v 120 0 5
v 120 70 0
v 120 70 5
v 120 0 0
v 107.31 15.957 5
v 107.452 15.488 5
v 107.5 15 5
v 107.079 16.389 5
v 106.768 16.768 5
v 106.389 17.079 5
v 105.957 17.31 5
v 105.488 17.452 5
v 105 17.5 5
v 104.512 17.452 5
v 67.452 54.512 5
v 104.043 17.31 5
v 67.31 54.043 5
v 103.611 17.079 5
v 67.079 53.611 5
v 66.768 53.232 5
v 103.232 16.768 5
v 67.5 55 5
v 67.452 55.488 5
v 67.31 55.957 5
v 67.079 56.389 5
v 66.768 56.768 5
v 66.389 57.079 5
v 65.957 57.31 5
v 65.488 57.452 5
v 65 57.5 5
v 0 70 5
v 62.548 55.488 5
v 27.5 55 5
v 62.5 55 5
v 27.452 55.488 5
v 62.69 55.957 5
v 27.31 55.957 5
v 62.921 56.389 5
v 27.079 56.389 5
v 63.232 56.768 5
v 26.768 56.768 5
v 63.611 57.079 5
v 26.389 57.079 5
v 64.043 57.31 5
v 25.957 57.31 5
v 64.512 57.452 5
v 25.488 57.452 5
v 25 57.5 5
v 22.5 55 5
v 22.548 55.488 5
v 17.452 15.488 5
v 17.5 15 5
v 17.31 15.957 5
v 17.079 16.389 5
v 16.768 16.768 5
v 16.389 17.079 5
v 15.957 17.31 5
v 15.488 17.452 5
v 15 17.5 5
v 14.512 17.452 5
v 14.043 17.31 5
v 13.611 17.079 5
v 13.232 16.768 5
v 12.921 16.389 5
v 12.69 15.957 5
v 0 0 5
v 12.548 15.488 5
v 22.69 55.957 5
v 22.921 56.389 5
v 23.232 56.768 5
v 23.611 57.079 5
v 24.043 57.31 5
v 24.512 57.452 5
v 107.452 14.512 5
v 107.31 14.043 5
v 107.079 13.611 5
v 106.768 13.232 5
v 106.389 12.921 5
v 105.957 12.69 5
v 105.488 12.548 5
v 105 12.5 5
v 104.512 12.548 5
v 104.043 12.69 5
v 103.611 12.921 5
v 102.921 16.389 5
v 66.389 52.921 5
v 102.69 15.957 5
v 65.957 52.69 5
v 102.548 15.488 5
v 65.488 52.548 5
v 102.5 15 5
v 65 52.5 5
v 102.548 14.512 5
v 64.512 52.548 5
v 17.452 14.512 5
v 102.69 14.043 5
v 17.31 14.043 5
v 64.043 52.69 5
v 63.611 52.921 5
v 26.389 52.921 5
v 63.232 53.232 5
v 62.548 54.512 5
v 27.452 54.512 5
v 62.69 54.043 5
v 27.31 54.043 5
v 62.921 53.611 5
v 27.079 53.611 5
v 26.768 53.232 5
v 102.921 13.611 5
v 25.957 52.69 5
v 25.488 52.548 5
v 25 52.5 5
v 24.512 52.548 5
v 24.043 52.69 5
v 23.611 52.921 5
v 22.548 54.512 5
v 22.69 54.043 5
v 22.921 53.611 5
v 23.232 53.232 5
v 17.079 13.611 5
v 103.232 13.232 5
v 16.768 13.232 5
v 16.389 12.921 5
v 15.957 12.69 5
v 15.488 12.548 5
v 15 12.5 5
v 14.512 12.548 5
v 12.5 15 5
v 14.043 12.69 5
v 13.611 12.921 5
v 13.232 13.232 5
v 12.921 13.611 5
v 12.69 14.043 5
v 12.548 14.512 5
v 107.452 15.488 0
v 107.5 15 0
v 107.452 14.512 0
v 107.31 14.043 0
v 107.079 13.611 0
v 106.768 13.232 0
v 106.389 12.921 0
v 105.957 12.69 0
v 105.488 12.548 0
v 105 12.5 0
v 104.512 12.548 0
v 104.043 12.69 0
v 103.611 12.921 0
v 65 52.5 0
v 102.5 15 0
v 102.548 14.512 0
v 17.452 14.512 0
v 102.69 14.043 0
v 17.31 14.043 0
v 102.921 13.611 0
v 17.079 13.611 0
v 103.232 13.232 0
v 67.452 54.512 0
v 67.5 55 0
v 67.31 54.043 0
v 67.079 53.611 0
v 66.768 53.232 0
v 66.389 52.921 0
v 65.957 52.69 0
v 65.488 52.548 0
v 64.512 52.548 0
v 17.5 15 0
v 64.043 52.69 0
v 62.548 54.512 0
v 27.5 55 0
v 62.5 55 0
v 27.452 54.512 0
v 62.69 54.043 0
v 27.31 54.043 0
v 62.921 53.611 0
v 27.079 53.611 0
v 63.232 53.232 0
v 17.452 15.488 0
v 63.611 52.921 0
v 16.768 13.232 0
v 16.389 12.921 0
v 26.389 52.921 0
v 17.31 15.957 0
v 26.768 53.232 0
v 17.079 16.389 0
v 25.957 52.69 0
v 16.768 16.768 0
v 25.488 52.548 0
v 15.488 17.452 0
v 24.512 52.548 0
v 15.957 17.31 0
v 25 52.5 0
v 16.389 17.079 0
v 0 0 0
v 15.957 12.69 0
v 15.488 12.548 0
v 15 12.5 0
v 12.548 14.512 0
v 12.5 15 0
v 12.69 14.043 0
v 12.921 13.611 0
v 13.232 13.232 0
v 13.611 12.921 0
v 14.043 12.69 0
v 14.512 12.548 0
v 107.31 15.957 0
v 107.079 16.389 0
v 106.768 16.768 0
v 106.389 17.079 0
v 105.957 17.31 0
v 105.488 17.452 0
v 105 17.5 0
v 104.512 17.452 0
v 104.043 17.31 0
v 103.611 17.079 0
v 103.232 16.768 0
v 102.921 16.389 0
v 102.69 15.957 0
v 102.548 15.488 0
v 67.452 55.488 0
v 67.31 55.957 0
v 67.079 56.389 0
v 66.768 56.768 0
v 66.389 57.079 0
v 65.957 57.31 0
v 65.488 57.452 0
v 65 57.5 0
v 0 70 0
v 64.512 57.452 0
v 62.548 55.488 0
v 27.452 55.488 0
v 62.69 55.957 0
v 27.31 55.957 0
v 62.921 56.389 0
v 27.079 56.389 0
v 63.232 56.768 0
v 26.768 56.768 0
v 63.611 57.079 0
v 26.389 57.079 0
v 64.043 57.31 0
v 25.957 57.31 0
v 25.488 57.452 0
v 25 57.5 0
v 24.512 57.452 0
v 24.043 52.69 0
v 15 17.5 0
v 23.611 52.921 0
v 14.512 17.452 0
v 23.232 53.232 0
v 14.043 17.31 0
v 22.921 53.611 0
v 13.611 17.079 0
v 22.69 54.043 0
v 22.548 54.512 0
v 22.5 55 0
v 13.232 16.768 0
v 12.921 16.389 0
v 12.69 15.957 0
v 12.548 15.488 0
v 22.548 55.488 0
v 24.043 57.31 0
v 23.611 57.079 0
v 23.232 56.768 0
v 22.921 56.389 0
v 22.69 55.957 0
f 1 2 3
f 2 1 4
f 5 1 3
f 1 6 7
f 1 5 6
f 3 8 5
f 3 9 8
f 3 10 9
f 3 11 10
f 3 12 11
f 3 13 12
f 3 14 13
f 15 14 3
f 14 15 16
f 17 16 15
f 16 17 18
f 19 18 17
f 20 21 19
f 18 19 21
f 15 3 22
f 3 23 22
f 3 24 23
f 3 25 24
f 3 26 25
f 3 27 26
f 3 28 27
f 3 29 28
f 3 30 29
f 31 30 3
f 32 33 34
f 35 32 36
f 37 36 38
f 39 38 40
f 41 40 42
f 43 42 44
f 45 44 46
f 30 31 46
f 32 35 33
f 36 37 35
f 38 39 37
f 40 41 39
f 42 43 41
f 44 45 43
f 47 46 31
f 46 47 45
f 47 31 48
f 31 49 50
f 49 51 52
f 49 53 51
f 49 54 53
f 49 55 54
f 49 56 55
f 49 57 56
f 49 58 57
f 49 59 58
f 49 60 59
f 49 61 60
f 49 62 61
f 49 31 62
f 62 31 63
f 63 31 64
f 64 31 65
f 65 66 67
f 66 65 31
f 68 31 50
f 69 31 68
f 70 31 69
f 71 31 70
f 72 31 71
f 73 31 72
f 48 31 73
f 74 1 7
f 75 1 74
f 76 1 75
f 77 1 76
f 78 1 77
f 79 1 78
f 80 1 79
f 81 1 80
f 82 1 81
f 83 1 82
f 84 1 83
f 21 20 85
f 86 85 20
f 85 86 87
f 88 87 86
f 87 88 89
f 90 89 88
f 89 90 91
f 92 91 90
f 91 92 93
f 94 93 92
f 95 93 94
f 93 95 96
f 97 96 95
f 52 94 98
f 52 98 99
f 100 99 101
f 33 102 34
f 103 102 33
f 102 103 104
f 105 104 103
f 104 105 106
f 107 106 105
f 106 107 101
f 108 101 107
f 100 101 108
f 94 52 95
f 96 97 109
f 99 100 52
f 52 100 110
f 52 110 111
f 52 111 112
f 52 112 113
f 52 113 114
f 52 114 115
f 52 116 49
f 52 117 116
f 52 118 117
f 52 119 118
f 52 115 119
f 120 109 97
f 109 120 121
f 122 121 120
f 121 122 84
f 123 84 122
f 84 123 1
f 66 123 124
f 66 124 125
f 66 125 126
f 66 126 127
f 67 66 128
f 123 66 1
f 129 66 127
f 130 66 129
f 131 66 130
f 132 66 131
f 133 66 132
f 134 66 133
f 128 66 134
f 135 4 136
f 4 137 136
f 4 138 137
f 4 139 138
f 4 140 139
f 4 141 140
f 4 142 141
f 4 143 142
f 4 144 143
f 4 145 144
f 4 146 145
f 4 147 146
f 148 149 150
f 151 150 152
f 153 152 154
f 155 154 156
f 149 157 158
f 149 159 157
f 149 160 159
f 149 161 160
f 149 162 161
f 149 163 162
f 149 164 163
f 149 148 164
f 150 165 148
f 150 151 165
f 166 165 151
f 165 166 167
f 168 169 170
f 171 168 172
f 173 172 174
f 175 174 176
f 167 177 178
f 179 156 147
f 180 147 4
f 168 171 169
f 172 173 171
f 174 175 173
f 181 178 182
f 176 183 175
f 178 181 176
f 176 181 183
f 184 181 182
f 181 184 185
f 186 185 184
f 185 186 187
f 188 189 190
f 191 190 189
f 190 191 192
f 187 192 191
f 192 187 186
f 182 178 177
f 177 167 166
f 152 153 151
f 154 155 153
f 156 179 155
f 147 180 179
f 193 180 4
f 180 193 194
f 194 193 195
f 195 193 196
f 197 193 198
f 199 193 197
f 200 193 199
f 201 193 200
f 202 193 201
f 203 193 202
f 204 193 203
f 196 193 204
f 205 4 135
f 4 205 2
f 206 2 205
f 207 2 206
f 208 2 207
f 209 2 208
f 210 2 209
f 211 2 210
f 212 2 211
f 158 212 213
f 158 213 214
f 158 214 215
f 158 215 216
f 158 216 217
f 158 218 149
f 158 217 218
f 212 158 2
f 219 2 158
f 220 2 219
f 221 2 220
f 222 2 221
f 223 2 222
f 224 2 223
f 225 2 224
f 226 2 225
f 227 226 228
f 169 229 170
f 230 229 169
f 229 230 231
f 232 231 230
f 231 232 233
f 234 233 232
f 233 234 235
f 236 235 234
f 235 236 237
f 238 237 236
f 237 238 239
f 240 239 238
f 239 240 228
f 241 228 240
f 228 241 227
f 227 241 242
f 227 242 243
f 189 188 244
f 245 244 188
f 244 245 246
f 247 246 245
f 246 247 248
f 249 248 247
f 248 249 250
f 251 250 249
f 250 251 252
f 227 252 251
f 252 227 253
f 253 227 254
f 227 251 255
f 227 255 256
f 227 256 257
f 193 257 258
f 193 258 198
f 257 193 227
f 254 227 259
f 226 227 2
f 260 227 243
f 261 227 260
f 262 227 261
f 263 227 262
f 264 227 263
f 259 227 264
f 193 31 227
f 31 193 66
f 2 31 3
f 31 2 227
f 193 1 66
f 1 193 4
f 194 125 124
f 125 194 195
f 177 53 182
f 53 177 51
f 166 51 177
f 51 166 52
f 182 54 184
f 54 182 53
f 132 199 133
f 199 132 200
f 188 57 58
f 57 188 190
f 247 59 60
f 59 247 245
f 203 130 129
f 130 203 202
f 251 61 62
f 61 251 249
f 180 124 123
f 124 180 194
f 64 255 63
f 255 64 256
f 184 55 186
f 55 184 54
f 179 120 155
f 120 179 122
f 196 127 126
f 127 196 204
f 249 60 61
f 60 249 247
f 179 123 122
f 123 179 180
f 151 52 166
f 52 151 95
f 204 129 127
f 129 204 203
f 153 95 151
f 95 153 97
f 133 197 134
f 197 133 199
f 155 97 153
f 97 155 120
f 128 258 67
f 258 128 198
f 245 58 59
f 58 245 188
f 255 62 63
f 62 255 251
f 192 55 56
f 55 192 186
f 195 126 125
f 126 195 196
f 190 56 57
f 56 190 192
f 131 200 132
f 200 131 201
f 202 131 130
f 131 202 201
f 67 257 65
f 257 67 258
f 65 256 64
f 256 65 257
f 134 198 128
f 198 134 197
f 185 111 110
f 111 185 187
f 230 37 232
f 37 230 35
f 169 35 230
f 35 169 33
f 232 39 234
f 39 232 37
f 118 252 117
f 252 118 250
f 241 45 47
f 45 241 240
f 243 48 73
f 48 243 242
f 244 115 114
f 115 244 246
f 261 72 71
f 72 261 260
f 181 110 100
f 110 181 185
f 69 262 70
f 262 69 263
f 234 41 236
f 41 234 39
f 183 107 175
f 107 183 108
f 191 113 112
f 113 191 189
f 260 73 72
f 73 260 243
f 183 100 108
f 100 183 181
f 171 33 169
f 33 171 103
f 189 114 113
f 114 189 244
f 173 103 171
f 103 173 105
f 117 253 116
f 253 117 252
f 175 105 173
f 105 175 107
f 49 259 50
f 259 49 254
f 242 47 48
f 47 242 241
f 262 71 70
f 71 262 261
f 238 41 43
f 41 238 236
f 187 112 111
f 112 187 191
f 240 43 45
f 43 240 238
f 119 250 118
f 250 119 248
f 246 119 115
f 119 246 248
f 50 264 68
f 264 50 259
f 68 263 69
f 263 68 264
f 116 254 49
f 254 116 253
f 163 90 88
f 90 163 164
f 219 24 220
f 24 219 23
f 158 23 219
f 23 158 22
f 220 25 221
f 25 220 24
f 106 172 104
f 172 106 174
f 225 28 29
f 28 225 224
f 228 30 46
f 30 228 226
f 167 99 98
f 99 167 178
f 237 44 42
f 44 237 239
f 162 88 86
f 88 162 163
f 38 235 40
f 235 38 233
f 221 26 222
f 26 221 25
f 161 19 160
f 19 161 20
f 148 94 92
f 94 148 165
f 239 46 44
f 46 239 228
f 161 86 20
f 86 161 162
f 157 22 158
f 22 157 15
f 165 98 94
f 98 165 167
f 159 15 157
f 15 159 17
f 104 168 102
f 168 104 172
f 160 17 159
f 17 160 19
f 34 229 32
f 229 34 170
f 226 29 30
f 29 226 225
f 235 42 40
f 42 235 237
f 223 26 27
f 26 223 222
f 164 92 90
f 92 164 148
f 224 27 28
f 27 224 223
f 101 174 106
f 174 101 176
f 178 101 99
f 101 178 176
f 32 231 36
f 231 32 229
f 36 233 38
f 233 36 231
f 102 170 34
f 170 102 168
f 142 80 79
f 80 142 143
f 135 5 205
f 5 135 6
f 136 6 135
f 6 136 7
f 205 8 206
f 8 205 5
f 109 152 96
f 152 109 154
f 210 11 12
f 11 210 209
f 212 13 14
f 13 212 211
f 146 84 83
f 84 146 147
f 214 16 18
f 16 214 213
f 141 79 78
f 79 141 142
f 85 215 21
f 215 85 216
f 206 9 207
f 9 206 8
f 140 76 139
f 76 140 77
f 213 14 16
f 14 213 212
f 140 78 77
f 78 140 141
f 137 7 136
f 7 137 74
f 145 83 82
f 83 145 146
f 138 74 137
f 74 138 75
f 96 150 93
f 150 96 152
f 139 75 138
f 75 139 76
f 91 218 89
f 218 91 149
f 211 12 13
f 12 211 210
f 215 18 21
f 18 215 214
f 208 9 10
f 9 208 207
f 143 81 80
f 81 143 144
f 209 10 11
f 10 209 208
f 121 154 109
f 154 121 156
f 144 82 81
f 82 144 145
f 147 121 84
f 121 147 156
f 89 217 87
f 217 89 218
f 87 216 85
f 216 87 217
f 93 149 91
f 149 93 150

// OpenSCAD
$fn = 32;

// ----------------------------------------------------------------------
// Hole field: plate with holes at given coordinates
// ----------------------------------------------------------------------

// --- parameters (mm) ---
plate_l = 120;            // plate length, X
plate_w = 70;             // plate width, Y
plate_t = 5;              // plate thickness, Z
hole_d = 5;               // hole diameter
fit_tol = 0.05;           // tolerance for press fits, mm
free_tol = 0.2;           // tolerance for clearance fits, mm

difference() {
  cube([plate_l, plate_w, plate_t]);
  translate([15, 15, -1]) cylinder(h = plate_t + 2, d = hole_d);
  translate([25, 55, -1]) cylinder(h = plate_t + 2, d = hole_d);
  translate([65, 55, -1]) cylinder(h = plate_t + 2, d = hole_d);
  translate([105, 15, -1]) cylinder(h = plate_t + 2, d = hole_d);
}
